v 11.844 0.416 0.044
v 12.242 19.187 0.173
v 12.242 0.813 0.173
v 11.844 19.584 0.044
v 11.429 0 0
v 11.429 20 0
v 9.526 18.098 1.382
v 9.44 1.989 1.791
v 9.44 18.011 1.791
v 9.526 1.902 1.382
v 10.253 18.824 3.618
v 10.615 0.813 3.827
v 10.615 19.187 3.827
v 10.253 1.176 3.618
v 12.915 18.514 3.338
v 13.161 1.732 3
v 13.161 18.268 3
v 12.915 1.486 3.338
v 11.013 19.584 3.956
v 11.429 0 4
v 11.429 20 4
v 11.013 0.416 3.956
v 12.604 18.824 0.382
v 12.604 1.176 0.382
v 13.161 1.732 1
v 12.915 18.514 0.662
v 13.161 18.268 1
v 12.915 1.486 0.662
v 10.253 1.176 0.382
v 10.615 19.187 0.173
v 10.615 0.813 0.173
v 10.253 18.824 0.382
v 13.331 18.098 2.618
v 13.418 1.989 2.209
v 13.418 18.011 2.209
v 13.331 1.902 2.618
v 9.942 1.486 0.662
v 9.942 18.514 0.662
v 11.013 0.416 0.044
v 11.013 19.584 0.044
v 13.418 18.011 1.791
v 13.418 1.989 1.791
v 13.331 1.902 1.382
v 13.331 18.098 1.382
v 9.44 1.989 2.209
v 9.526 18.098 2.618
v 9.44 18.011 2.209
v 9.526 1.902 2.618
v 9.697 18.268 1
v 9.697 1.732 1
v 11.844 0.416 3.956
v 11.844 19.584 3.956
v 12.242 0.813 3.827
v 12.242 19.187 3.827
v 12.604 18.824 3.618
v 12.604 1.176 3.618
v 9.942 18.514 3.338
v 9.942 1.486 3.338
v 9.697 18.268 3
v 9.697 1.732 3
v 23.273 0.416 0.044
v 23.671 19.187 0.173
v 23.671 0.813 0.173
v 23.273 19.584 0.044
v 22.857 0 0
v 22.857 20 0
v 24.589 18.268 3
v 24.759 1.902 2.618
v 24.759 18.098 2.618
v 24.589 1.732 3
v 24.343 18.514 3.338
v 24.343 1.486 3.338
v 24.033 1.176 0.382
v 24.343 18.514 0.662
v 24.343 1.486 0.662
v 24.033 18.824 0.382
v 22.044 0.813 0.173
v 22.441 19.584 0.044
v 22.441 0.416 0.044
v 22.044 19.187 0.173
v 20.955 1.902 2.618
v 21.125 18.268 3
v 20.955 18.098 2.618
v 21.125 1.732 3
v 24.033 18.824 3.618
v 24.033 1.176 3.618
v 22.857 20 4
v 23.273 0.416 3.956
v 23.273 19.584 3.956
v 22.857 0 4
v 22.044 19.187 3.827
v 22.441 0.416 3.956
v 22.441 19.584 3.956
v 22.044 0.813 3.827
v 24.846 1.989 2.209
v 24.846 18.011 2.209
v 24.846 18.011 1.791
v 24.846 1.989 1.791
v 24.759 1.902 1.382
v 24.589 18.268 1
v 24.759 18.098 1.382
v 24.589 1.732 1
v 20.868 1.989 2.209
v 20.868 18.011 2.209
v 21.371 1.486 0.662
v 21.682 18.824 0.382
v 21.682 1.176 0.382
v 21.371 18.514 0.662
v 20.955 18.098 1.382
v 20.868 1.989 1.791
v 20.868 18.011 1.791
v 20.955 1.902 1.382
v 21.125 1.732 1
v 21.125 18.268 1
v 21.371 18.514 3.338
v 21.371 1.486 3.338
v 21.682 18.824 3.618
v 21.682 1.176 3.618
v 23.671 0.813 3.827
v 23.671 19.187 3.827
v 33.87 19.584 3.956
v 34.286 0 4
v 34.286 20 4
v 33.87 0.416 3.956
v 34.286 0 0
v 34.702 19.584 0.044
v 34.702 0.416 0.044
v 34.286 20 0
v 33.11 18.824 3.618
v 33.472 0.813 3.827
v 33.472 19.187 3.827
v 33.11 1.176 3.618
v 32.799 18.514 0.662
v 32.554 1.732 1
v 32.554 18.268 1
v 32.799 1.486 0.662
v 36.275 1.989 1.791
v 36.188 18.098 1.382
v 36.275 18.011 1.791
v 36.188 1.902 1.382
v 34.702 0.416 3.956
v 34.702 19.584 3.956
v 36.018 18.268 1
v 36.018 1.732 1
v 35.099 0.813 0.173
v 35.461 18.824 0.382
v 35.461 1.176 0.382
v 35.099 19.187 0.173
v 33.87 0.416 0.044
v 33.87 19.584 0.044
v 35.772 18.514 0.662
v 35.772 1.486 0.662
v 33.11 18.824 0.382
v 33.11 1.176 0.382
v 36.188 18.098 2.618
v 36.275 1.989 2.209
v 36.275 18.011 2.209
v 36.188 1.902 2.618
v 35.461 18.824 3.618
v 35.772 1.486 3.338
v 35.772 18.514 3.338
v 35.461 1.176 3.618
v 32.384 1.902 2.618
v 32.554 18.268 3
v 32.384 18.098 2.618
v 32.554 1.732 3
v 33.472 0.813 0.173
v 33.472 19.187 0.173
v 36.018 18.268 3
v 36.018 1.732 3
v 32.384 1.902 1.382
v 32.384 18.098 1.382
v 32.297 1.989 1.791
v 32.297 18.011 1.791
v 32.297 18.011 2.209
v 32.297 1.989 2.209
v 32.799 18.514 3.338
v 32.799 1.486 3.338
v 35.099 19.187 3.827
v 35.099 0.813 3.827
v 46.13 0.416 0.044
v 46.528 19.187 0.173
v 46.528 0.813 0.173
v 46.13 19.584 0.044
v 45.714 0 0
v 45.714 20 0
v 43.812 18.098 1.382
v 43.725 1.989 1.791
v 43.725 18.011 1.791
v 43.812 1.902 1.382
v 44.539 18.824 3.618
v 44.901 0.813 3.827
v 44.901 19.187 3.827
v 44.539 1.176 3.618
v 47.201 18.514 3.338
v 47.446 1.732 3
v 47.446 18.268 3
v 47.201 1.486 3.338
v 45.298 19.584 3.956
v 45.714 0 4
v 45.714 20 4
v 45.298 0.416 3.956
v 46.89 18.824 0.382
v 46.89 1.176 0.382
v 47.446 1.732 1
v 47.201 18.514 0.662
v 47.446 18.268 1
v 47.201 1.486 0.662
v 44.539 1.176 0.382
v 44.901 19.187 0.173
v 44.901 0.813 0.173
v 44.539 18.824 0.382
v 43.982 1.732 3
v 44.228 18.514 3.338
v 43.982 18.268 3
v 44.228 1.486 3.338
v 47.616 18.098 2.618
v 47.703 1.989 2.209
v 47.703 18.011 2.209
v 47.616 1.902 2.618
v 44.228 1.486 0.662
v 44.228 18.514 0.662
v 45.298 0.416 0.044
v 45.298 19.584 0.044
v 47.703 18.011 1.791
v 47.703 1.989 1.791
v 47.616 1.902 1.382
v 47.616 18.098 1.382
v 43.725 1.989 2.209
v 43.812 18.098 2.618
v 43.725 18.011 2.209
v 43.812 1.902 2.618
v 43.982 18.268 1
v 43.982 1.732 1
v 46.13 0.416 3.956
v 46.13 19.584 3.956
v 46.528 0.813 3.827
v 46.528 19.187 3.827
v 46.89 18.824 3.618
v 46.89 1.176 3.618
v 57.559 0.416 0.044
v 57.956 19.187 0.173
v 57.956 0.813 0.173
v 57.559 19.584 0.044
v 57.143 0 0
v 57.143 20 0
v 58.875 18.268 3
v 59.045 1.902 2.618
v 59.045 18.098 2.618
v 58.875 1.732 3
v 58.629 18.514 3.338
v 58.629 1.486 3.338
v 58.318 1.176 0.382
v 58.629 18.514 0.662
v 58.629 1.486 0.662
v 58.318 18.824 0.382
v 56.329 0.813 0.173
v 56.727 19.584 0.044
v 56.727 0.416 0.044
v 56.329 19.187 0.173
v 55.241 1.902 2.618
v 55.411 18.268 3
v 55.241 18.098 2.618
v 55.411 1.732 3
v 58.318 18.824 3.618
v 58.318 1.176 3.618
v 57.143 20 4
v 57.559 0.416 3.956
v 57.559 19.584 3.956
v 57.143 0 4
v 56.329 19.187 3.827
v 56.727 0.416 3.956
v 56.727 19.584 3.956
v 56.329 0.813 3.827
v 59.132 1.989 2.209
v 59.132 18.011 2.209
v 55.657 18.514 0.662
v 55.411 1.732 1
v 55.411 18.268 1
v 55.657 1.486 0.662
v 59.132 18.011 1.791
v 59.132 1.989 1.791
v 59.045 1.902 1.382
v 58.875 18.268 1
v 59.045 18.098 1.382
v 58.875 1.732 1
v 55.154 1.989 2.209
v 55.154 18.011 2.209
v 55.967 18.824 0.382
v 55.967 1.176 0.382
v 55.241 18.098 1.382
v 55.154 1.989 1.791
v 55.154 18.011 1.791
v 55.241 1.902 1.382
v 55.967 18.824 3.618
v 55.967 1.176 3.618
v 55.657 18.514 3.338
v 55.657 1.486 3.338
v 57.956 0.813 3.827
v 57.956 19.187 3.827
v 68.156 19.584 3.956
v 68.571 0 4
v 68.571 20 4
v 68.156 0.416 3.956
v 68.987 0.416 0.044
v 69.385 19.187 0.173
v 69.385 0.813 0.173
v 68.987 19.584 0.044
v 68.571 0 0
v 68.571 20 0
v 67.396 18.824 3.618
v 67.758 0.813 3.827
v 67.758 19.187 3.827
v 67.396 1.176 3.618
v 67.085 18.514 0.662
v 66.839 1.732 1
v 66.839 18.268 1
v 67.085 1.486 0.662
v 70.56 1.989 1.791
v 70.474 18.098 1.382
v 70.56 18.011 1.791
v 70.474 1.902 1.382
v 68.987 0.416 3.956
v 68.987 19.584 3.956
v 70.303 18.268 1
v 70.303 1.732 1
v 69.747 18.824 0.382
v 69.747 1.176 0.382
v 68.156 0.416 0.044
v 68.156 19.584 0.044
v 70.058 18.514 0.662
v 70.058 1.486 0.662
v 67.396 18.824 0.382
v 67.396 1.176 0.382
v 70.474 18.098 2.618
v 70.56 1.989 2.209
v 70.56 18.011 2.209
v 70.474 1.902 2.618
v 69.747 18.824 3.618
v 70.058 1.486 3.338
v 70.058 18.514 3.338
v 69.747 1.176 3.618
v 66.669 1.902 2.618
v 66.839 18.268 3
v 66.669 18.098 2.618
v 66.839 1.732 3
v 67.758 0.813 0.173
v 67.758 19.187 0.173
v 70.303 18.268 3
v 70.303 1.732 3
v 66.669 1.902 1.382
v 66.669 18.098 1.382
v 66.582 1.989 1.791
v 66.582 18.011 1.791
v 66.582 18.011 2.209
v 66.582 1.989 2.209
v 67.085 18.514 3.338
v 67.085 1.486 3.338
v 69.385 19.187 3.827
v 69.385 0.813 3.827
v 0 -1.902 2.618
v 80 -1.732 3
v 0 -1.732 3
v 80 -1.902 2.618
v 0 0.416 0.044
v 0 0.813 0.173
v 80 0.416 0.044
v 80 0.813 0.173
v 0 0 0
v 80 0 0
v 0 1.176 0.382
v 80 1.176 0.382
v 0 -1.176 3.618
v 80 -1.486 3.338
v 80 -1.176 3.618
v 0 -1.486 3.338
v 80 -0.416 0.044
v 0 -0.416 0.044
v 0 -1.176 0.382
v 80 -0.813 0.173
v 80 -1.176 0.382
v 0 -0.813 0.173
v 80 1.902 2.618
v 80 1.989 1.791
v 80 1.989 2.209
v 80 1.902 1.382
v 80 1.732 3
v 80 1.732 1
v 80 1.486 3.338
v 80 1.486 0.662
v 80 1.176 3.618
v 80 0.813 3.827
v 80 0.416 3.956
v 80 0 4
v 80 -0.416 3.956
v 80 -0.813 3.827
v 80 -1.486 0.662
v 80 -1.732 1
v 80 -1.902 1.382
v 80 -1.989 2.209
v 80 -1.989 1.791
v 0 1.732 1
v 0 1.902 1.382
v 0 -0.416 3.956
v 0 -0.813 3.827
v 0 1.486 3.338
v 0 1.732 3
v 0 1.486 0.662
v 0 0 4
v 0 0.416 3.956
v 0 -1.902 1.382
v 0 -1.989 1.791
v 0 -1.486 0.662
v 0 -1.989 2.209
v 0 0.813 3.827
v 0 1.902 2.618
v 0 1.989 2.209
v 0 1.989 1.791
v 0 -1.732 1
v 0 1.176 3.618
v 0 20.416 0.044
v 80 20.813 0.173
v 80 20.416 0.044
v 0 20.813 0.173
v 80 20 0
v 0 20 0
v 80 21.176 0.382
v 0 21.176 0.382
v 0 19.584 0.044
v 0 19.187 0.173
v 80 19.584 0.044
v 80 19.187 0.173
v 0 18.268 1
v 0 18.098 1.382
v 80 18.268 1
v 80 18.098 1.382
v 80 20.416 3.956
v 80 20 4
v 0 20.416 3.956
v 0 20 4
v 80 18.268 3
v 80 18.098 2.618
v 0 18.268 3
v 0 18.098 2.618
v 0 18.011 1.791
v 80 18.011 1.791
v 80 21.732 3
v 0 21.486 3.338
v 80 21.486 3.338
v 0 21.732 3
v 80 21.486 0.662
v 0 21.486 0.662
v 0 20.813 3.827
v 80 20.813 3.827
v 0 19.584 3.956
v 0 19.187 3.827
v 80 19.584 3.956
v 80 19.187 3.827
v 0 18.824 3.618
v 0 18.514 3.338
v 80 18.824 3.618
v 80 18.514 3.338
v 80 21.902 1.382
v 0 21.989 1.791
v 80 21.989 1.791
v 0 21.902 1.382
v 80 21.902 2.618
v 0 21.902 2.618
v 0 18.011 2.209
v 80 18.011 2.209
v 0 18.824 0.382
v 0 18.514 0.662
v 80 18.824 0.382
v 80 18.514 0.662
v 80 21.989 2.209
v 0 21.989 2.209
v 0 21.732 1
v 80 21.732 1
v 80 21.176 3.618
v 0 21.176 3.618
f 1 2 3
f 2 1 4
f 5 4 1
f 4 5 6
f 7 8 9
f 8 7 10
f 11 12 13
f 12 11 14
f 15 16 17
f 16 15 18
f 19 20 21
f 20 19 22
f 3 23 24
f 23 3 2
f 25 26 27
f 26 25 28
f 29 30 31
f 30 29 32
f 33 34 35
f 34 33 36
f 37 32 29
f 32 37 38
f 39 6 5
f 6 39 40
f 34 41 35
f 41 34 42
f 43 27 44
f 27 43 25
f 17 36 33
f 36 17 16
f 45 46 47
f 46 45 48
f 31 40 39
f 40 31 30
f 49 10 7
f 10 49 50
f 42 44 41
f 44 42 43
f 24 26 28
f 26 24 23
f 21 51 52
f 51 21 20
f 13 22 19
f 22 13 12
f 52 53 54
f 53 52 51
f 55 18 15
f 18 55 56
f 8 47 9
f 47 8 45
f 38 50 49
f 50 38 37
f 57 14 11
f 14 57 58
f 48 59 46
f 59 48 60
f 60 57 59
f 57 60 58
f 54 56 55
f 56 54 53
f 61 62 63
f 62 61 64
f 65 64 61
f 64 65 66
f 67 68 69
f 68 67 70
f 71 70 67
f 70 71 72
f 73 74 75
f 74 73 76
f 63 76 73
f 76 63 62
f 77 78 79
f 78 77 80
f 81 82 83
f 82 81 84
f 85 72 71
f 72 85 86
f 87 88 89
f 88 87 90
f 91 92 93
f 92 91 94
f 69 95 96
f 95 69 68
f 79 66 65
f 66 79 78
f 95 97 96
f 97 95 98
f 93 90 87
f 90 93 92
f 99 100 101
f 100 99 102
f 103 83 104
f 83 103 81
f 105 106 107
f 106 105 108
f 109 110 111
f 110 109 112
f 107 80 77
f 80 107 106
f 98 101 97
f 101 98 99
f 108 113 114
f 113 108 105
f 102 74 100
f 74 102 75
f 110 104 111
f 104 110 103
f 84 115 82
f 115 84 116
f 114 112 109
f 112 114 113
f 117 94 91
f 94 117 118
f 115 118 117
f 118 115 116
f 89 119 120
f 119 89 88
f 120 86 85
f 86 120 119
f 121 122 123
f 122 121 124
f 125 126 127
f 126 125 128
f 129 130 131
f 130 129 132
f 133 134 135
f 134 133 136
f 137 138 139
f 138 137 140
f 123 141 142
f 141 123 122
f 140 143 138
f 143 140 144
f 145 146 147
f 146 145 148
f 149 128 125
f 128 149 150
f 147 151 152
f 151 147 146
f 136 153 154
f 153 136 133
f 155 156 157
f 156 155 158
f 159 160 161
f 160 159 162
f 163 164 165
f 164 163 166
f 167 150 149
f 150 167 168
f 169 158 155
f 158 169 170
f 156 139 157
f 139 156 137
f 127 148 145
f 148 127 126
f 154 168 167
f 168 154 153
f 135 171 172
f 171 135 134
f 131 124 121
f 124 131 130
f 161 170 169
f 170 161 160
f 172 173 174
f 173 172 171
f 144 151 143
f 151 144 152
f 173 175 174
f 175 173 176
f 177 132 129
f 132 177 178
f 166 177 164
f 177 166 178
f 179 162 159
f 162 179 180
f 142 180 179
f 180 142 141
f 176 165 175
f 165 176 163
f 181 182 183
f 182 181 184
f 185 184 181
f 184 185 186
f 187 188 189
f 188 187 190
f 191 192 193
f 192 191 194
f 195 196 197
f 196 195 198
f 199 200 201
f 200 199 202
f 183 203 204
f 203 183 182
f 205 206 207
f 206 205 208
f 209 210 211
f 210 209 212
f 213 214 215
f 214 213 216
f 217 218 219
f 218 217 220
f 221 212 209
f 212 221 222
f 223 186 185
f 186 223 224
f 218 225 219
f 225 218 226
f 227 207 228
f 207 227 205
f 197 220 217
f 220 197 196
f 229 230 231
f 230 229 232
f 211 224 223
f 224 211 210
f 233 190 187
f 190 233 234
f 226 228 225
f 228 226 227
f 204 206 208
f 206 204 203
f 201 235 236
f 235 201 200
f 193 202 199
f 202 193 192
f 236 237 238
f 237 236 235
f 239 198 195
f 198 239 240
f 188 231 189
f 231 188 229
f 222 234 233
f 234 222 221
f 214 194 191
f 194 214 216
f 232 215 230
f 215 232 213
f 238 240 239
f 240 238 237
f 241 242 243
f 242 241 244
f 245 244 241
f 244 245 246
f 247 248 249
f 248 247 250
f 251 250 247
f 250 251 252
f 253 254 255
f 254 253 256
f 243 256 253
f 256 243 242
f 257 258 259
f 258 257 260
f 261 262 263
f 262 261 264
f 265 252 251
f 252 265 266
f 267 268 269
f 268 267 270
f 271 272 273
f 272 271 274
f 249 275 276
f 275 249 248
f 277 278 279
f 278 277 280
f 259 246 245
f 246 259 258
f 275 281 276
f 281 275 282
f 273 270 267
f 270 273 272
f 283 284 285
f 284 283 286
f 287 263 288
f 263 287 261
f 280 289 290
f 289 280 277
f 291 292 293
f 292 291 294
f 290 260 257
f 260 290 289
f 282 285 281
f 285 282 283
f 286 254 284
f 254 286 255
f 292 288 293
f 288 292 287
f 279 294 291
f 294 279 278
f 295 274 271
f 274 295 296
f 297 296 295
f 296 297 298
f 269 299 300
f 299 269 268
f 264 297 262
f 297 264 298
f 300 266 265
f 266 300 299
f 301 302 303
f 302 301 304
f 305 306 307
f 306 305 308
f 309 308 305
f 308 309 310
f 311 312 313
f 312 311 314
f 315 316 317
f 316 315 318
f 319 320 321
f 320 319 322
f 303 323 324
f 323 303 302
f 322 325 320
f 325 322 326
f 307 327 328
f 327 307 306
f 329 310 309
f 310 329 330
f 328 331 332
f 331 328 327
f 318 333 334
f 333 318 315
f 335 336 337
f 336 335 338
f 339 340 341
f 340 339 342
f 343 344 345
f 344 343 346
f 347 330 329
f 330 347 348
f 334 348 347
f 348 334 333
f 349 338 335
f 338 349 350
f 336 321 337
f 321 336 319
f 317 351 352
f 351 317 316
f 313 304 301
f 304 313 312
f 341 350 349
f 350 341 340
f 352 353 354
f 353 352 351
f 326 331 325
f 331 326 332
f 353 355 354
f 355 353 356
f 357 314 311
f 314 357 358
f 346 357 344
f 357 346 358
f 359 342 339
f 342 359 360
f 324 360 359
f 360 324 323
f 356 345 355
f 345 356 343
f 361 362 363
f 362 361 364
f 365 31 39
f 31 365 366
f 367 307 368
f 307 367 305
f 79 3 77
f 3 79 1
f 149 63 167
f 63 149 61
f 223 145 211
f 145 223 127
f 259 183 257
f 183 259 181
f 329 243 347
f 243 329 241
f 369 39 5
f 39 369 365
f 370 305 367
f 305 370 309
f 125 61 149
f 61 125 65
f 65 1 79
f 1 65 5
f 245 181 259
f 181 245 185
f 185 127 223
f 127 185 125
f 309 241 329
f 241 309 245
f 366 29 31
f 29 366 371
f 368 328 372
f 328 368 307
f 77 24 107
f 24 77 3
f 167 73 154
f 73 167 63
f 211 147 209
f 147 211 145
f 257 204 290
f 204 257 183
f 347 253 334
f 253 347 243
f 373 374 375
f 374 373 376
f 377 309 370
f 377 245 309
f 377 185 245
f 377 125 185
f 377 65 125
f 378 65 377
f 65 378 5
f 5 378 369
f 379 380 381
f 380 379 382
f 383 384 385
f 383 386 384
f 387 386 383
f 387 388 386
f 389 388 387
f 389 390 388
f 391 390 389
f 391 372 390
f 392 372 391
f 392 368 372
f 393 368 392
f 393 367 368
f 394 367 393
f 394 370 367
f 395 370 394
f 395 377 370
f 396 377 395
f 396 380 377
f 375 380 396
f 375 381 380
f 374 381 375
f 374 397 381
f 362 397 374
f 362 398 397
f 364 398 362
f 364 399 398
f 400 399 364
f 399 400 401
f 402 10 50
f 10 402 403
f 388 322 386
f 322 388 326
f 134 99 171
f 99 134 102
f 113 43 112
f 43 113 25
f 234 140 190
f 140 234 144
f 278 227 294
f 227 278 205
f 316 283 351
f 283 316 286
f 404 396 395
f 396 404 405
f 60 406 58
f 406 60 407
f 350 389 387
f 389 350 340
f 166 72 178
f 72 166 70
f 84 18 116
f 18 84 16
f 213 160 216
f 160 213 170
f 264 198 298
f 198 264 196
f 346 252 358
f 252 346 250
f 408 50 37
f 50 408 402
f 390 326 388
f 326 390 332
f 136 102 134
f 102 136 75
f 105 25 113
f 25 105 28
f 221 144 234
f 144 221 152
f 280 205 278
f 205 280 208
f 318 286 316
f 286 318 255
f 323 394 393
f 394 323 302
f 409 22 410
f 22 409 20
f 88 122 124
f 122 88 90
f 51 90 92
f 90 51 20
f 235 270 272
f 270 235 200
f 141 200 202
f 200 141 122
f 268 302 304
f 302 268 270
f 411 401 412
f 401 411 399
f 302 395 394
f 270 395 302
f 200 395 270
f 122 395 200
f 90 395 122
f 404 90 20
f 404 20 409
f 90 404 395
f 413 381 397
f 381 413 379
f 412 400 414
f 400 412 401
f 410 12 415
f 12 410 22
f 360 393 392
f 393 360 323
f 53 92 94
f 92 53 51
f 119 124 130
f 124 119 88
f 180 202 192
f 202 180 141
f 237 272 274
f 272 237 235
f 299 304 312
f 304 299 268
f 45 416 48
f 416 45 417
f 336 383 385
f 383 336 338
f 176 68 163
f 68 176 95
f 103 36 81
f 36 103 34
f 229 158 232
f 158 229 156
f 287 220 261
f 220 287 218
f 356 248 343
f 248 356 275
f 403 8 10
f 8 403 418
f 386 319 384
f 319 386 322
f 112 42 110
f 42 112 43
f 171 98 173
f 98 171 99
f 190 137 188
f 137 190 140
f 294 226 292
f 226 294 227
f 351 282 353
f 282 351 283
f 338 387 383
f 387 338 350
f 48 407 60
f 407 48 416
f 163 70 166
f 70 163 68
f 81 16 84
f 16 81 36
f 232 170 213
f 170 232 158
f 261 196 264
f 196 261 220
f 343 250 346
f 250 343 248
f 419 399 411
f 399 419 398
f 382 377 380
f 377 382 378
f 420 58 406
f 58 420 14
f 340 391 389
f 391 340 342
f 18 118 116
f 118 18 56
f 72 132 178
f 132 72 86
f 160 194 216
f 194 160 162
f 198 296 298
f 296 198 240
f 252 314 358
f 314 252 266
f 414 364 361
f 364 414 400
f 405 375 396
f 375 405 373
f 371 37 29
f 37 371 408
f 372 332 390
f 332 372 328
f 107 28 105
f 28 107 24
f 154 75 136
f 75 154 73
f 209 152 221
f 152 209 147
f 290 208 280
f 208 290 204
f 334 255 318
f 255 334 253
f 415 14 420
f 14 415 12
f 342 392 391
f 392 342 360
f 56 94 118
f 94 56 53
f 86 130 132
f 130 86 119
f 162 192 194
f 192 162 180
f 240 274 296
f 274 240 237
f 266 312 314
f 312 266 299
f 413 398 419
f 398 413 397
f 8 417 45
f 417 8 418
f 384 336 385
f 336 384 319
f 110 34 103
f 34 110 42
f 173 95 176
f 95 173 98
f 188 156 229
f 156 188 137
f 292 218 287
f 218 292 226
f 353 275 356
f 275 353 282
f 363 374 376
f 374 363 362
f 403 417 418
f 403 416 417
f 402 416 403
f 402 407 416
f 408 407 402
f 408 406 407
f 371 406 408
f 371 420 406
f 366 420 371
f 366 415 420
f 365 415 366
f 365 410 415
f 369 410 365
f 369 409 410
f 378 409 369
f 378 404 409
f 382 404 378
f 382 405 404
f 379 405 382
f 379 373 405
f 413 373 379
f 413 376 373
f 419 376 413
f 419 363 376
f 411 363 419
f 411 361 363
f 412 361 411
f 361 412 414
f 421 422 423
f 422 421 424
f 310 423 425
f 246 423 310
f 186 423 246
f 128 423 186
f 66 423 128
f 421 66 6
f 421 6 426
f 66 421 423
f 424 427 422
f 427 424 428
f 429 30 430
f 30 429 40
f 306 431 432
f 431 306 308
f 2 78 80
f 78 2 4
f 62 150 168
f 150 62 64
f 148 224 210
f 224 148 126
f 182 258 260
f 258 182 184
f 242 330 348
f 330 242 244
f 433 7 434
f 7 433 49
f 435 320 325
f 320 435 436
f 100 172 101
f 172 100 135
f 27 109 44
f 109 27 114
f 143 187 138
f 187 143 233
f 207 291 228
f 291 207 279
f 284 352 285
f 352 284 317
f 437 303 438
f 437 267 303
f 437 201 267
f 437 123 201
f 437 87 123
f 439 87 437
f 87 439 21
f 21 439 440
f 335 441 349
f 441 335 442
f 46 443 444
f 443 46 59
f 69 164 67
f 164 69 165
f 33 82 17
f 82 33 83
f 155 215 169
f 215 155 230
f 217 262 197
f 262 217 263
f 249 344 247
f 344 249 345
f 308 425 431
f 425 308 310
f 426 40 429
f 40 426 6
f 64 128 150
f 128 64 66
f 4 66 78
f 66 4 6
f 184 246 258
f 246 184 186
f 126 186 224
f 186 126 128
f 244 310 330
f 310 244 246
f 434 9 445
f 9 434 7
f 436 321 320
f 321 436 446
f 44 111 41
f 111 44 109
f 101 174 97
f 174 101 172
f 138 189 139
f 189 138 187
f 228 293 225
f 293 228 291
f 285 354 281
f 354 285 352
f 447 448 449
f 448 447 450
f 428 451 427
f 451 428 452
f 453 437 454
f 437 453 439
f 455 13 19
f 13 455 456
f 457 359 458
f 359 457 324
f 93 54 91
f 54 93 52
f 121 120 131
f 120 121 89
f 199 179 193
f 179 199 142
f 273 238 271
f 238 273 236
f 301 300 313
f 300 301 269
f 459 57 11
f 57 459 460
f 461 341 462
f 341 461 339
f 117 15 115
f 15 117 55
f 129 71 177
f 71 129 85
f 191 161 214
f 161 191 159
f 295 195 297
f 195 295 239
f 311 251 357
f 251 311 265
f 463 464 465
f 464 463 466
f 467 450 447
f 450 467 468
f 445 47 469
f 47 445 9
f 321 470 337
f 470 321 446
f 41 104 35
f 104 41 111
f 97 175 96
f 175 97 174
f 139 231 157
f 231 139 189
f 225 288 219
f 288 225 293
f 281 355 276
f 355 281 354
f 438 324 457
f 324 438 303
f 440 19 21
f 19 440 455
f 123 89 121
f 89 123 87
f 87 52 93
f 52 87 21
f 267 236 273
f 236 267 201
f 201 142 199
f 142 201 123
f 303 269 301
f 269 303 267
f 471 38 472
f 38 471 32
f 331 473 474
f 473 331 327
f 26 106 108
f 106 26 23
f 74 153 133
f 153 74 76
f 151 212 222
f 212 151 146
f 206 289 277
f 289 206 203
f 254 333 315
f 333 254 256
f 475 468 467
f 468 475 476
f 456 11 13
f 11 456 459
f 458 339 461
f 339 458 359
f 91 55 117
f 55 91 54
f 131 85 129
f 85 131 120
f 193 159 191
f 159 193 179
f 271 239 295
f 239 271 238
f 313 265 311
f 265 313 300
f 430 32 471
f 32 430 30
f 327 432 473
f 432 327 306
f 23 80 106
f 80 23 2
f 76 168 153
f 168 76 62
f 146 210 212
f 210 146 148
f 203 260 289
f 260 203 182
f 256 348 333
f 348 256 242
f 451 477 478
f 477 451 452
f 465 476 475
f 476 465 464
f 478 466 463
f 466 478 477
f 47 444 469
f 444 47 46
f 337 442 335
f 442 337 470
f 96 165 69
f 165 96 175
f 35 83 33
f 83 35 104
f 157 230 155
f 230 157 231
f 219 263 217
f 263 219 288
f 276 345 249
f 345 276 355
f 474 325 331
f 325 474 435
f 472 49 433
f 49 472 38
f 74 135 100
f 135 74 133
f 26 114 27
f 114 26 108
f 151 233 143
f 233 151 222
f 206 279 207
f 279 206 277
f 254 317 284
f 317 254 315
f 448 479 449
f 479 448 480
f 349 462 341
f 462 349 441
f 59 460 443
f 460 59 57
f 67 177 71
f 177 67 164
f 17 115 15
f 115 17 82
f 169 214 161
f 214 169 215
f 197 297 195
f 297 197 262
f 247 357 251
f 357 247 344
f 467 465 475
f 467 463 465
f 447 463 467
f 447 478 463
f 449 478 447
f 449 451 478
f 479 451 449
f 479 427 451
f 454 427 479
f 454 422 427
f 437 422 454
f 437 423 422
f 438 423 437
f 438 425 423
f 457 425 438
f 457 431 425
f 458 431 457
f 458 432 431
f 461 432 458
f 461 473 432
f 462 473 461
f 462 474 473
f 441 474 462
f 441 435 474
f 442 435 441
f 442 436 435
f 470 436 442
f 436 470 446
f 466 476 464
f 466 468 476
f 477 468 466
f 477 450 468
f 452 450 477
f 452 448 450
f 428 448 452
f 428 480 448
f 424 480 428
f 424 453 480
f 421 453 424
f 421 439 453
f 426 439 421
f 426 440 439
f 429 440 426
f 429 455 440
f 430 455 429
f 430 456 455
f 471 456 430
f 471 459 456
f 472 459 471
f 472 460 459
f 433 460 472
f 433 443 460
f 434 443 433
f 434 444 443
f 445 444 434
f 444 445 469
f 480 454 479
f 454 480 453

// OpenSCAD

// LadderMaker  v1.0    Cylinder Version    BMB
// Simple ladder (or ladder shaped) maker script.  

// Usage: 1) Set desired user values below, 2) Render with F6, 
// 3) Export to STL, 4) Slice and print.  
// NOTE:  This script has no logic to protect you from putting in crazy
//        settings.  But if the render looks good it should print fine.
 
// ***** User Render Settings
$fn = 30;         // Minimum Angle (number of fragments when rendering, probably don't need to change)
lHeight = 80;     // Ladder Height mm (end-to-end)
lWidth = 20;      // Ladder Width mm (oc-to-oc)
lRungs = 6;       // Number of Rungs  
lRadius = 2;      // Ladder Radius mm  (remember it's radius not diameter!) 
// ***** End User Settings


gap = lHeight / (lRungs + 1);
echo("Rung Spacing: ", gap);
translate([0,0,lRadius]) {
  rotate(a=90,v=[0,1,0]) {
    cylinder(h=lHeight,r=lRadius);
      translate([0,lWidth,0]) {
        cylinder(h=lHeight,r=lRadius);  
      }
   
    for(a=[gap:gap:lHeight-gap/2]) {  
      rotate(a=90,v=[1,0,0]) {
        translate([0,a,-1*(lWidth)]) { 
          echo("Rung: ", a);  
          cylinder(h=lWidth,r=lRadius);
        }
      }
    }
  }
}


